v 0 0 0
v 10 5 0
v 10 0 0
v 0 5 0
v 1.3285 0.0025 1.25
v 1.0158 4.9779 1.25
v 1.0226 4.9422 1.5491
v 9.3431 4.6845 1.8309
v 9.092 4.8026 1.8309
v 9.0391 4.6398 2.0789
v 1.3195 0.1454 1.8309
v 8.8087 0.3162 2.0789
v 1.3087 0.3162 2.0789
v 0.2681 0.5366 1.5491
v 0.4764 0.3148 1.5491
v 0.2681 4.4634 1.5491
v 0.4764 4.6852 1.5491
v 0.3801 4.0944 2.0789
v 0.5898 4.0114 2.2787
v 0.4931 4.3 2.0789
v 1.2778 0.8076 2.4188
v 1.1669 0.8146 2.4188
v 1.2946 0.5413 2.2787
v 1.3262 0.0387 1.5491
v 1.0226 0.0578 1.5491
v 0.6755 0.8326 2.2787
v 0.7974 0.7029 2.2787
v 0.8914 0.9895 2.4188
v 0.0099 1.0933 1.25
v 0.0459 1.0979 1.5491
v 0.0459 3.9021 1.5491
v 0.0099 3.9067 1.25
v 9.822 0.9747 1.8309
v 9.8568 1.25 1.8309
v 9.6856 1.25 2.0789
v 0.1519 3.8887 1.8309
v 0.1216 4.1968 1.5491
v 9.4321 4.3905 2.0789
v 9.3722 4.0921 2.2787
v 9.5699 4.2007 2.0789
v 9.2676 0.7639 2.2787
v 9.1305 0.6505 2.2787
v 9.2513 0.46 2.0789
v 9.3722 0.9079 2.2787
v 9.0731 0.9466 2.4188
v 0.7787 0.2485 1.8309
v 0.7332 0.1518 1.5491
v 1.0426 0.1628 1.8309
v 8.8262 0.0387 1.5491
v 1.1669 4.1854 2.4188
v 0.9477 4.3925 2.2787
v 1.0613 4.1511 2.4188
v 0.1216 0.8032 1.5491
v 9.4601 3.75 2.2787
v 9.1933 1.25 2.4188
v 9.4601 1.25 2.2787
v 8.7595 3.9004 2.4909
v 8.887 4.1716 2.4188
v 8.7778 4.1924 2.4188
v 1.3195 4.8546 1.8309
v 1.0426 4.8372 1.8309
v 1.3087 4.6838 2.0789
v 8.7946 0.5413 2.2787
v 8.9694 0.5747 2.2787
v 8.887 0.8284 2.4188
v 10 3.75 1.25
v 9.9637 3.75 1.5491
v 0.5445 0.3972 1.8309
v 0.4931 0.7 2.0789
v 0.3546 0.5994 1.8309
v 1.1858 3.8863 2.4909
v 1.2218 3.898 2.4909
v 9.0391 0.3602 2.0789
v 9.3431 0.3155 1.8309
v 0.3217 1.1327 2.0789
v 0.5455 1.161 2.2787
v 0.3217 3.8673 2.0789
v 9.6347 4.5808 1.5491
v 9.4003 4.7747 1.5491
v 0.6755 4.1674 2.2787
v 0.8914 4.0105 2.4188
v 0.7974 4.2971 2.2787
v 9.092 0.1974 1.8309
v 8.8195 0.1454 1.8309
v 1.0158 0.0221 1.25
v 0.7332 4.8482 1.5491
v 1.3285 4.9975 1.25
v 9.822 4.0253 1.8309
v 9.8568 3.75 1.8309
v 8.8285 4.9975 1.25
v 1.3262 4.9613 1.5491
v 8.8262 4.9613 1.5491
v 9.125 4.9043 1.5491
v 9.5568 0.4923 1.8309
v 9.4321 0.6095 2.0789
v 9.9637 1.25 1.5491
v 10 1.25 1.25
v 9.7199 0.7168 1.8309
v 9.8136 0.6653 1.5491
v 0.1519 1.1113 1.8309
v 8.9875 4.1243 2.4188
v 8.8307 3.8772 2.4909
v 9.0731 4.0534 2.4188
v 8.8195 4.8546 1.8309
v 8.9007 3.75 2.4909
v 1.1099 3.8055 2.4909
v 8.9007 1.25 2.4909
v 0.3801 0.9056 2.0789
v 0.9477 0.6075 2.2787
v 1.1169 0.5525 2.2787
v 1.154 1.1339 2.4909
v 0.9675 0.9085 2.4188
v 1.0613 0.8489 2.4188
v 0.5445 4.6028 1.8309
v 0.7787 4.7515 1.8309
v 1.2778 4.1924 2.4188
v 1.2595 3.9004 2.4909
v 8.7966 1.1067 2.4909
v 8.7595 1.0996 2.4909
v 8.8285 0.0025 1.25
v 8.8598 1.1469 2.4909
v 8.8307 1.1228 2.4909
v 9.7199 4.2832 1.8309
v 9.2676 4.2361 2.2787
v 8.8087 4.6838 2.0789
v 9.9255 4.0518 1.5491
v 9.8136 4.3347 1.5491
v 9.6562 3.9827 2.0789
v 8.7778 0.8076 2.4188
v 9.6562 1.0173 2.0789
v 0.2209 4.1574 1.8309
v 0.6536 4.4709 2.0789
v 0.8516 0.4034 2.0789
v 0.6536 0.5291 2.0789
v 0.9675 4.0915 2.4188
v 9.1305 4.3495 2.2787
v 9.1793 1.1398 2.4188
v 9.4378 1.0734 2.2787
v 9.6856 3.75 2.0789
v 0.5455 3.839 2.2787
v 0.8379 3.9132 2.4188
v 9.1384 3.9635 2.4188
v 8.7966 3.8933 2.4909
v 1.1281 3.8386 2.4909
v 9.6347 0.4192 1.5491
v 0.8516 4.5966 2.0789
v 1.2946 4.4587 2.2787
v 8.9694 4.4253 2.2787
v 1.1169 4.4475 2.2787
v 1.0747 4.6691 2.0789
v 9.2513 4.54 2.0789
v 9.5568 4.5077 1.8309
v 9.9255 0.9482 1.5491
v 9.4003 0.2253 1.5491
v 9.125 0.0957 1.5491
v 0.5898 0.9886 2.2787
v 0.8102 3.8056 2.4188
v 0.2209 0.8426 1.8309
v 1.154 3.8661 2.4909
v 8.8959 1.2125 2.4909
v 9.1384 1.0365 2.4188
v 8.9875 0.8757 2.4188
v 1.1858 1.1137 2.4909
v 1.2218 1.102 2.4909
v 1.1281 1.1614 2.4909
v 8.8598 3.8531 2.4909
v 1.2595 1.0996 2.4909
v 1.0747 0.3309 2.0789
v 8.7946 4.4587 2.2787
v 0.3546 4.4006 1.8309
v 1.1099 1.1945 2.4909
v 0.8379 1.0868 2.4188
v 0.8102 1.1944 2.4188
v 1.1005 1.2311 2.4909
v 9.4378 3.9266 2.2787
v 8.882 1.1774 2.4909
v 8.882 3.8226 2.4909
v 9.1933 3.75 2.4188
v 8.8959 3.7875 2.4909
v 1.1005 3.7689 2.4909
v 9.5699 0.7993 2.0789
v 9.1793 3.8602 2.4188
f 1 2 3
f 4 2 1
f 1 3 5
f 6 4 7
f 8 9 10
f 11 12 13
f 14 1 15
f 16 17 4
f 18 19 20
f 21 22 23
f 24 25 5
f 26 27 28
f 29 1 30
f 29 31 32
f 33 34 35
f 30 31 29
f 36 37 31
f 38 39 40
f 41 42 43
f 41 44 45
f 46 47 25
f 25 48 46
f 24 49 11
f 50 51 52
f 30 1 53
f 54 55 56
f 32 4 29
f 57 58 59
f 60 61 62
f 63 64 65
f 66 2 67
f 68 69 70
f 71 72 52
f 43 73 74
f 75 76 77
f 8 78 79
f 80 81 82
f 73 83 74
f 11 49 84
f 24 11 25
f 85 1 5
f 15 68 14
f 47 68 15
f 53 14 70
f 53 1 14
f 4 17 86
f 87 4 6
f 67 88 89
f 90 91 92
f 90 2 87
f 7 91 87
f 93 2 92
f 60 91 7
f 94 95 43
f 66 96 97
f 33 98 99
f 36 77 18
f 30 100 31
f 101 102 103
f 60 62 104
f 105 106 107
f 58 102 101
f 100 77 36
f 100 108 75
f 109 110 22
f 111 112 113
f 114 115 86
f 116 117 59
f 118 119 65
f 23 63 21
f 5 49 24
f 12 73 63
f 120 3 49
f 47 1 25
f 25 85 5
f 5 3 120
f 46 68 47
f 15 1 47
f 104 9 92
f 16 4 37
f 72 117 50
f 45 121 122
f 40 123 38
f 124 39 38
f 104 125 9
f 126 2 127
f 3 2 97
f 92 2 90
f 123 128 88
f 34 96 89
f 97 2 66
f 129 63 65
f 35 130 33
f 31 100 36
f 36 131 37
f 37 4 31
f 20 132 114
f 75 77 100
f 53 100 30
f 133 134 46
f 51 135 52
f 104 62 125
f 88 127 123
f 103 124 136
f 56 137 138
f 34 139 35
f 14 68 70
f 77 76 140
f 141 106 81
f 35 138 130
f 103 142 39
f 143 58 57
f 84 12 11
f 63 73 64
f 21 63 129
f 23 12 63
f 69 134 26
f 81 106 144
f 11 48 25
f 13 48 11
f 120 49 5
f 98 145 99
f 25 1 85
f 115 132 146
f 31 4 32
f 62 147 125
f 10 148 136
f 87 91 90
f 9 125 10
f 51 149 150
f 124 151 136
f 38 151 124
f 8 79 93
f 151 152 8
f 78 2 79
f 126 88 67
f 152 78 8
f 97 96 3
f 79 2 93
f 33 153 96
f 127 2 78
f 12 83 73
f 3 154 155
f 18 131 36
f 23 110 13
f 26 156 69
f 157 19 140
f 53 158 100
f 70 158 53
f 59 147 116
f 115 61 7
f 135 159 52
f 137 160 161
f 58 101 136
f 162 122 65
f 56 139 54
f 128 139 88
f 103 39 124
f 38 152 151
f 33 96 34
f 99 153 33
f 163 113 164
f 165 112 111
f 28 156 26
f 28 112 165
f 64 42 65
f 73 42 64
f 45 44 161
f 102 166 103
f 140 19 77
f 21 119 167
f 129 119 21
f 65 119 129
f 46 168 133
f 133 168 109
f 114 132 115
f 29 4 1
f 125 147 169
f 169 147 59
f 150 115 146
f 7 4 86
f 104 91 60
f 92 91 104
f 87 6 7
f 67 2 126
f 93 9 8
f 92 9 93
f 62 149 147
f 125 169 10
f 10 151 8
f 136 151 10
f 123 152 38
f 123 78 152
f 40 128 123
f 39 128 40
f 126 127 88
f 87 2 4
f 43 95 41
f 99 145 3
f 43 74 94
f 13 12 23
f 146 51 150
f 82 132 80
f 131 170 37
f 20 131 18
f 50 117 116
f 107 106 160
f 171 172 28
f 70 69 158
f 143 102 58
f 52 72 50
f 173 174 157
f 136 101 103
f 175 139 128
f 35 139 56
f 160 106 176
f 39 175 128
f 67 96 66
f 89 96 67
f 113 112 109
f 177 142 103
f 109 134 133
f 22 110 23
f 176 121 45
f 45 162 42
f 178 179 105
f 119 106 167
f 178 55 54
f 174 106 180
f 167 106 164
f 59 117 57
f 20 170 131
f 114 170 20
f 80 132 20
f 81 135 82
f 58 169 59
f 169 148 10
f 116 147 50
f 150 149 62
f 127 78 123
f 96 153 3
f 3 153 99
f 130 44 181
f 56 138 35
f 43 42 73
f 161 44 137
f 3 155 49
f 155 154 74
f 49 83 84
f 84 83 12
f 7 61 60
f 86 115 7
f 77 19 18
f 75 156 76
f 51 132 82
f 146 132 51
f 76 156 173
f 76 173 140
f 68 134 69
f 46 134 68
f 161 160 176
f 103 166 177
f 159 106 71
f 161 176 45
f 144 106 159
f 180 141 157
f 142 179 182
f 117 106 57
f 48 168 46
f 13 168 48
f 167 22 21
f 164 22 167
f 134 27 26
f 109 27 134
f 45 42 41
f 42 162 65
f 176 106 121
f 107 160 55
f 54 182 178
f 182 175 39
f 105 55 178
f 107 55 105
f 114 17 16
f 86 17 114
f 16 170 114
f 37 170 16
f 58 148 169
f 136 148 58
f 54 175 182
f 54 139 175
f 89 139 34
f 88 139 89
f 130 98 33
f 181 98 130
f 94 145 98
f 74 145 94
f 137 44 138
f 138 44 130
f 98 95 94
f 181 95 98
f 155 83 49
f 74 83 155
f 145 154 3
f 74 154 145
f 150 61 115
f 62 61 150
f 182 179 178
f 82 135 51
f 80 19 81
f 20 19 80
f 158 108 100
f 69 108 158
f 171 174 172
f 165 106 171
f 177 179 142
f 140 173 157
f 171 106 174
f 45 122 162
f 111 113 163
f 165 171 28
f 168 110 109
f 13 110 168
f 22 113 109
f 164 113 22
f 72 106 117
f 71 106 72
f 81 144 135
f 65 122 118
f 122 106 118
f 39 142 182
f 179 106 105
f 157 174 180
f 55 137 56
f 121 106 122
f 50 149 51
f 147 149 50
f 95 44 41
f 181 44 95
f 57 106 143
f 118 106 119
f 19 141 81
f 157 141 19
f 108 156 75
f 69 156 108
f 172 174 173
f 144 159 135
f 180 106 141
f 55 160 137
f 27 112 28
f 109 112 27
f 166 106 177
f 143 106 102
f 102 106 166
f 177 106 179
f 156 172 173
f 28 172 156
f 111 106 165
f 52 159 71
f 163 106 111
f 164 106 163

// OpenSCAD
// file: ../list.scad
// Copyright 2017 Pavel Penev
// https://www.thingiverse.com/pavpen/about
//
// You can use this file under Attribution-ShareAlike 4.0 International
// (CC BY-SA 4.0).
//
// If you need to use it under another license, send me a message.

// Common list functions.


// Adds all elements in a list.
function pro_pavpen_list_sum(list, start_index = 0) =
    len(list) > 0 && start_index < len(list) ?
        list[start_index] + pro_pavpen_list_sum(list, start_index + 1) :
        0;

function pro_pavpen_list_elementwise_product(a, b) =
    [for (i = [0 : len(a) - 1])
        a[i] * b[i]
    ];

// Returns a given list with the last `drop_elements_count` elements removed.
function pro_pavpen_list_drop_last(list, drop_elements_count) =
    drop_elements_count >= len(list) ?
        [] :
        [for (i = [0 : len(list) - 1 - drop_elements_count])
            list[i]
        ];
// main file
// Copyright 2017 Pavel Penev
// https://www.thingiverse.com/pavpen/about
//
// You can use this file under Attribution-ShareAlike 4.0 International
// (CC BY-SA 4.0).
//
// If you need to use it under another license, send me a message.

use <../list.scad>

// Demo:
pro_pavpen_rounded_corner_cube(
    [10, 5, 2.5],
    corner_r = [0, 0, 0, 0, 1.25, 1.25, 1.25, 1.25],
    $fn = 25);


// Renders a cube solid with rounded corners.
//     size = cube edge (scalar), or cube [x, y, z] dimensions.
//     corner_r = radius of the rounded corner (scalar), or
// [r, r, r, r, r, r, r, r] vector of radii of the rounded corners for each
// cube vertex.  Vertices are enumerated from low z to high z (bottom face
// first), low y to high y (front first), and, finally, low x to high x
// (left side first).
//     center = whether the cube center is at the origin, or a vertex.
module pro_pavpen_rounded_corner_cube(
    size,
    corner_r = 1.5,
    center = false
)
{
    outer_dimensions = len(size) == undef ? [size, size, size] : size;

    hull()
    {
        for (z_idx = [0, 1])
        {
            for (y_idx = [0, 1])
            {
                for (x_idx = [0, 1])
                {
                    r = len(corner_r) == undef ?
                        corner_r :
                        corner_r[x_idx + 2 * y_idx + 4 * z_idx];
                    vertex_offset = pro_pavpen_list_elementwise_product(
                            (center ?
                                [x_idx, y_idx, z_idx] / 2 :
                                [x_idx, y_idx, z_idx]),
                            outer_dimensions);
                    sphere_center_offset =
                        r * [1 - 2 * x_idx, 1 - 2 * y_idx, 1 - 2 * z_idx];

                    // Ensure we don't extend outside the cube's outer
                    // dimensions:
                    intersection()
                    {
                        if (r > 0)
                        {
                            translate(vertex_offset +sphere_center_offset)
                            sphere(r = r);
                        }
                        else
                        {
                            translate(vertex_offset + sphere_center_offset)
                            cube(size = 1e-5, center = true);
                        }
                        
                        cube(size = size, center = center);
                    }
                }
            }
        }
    }
}
